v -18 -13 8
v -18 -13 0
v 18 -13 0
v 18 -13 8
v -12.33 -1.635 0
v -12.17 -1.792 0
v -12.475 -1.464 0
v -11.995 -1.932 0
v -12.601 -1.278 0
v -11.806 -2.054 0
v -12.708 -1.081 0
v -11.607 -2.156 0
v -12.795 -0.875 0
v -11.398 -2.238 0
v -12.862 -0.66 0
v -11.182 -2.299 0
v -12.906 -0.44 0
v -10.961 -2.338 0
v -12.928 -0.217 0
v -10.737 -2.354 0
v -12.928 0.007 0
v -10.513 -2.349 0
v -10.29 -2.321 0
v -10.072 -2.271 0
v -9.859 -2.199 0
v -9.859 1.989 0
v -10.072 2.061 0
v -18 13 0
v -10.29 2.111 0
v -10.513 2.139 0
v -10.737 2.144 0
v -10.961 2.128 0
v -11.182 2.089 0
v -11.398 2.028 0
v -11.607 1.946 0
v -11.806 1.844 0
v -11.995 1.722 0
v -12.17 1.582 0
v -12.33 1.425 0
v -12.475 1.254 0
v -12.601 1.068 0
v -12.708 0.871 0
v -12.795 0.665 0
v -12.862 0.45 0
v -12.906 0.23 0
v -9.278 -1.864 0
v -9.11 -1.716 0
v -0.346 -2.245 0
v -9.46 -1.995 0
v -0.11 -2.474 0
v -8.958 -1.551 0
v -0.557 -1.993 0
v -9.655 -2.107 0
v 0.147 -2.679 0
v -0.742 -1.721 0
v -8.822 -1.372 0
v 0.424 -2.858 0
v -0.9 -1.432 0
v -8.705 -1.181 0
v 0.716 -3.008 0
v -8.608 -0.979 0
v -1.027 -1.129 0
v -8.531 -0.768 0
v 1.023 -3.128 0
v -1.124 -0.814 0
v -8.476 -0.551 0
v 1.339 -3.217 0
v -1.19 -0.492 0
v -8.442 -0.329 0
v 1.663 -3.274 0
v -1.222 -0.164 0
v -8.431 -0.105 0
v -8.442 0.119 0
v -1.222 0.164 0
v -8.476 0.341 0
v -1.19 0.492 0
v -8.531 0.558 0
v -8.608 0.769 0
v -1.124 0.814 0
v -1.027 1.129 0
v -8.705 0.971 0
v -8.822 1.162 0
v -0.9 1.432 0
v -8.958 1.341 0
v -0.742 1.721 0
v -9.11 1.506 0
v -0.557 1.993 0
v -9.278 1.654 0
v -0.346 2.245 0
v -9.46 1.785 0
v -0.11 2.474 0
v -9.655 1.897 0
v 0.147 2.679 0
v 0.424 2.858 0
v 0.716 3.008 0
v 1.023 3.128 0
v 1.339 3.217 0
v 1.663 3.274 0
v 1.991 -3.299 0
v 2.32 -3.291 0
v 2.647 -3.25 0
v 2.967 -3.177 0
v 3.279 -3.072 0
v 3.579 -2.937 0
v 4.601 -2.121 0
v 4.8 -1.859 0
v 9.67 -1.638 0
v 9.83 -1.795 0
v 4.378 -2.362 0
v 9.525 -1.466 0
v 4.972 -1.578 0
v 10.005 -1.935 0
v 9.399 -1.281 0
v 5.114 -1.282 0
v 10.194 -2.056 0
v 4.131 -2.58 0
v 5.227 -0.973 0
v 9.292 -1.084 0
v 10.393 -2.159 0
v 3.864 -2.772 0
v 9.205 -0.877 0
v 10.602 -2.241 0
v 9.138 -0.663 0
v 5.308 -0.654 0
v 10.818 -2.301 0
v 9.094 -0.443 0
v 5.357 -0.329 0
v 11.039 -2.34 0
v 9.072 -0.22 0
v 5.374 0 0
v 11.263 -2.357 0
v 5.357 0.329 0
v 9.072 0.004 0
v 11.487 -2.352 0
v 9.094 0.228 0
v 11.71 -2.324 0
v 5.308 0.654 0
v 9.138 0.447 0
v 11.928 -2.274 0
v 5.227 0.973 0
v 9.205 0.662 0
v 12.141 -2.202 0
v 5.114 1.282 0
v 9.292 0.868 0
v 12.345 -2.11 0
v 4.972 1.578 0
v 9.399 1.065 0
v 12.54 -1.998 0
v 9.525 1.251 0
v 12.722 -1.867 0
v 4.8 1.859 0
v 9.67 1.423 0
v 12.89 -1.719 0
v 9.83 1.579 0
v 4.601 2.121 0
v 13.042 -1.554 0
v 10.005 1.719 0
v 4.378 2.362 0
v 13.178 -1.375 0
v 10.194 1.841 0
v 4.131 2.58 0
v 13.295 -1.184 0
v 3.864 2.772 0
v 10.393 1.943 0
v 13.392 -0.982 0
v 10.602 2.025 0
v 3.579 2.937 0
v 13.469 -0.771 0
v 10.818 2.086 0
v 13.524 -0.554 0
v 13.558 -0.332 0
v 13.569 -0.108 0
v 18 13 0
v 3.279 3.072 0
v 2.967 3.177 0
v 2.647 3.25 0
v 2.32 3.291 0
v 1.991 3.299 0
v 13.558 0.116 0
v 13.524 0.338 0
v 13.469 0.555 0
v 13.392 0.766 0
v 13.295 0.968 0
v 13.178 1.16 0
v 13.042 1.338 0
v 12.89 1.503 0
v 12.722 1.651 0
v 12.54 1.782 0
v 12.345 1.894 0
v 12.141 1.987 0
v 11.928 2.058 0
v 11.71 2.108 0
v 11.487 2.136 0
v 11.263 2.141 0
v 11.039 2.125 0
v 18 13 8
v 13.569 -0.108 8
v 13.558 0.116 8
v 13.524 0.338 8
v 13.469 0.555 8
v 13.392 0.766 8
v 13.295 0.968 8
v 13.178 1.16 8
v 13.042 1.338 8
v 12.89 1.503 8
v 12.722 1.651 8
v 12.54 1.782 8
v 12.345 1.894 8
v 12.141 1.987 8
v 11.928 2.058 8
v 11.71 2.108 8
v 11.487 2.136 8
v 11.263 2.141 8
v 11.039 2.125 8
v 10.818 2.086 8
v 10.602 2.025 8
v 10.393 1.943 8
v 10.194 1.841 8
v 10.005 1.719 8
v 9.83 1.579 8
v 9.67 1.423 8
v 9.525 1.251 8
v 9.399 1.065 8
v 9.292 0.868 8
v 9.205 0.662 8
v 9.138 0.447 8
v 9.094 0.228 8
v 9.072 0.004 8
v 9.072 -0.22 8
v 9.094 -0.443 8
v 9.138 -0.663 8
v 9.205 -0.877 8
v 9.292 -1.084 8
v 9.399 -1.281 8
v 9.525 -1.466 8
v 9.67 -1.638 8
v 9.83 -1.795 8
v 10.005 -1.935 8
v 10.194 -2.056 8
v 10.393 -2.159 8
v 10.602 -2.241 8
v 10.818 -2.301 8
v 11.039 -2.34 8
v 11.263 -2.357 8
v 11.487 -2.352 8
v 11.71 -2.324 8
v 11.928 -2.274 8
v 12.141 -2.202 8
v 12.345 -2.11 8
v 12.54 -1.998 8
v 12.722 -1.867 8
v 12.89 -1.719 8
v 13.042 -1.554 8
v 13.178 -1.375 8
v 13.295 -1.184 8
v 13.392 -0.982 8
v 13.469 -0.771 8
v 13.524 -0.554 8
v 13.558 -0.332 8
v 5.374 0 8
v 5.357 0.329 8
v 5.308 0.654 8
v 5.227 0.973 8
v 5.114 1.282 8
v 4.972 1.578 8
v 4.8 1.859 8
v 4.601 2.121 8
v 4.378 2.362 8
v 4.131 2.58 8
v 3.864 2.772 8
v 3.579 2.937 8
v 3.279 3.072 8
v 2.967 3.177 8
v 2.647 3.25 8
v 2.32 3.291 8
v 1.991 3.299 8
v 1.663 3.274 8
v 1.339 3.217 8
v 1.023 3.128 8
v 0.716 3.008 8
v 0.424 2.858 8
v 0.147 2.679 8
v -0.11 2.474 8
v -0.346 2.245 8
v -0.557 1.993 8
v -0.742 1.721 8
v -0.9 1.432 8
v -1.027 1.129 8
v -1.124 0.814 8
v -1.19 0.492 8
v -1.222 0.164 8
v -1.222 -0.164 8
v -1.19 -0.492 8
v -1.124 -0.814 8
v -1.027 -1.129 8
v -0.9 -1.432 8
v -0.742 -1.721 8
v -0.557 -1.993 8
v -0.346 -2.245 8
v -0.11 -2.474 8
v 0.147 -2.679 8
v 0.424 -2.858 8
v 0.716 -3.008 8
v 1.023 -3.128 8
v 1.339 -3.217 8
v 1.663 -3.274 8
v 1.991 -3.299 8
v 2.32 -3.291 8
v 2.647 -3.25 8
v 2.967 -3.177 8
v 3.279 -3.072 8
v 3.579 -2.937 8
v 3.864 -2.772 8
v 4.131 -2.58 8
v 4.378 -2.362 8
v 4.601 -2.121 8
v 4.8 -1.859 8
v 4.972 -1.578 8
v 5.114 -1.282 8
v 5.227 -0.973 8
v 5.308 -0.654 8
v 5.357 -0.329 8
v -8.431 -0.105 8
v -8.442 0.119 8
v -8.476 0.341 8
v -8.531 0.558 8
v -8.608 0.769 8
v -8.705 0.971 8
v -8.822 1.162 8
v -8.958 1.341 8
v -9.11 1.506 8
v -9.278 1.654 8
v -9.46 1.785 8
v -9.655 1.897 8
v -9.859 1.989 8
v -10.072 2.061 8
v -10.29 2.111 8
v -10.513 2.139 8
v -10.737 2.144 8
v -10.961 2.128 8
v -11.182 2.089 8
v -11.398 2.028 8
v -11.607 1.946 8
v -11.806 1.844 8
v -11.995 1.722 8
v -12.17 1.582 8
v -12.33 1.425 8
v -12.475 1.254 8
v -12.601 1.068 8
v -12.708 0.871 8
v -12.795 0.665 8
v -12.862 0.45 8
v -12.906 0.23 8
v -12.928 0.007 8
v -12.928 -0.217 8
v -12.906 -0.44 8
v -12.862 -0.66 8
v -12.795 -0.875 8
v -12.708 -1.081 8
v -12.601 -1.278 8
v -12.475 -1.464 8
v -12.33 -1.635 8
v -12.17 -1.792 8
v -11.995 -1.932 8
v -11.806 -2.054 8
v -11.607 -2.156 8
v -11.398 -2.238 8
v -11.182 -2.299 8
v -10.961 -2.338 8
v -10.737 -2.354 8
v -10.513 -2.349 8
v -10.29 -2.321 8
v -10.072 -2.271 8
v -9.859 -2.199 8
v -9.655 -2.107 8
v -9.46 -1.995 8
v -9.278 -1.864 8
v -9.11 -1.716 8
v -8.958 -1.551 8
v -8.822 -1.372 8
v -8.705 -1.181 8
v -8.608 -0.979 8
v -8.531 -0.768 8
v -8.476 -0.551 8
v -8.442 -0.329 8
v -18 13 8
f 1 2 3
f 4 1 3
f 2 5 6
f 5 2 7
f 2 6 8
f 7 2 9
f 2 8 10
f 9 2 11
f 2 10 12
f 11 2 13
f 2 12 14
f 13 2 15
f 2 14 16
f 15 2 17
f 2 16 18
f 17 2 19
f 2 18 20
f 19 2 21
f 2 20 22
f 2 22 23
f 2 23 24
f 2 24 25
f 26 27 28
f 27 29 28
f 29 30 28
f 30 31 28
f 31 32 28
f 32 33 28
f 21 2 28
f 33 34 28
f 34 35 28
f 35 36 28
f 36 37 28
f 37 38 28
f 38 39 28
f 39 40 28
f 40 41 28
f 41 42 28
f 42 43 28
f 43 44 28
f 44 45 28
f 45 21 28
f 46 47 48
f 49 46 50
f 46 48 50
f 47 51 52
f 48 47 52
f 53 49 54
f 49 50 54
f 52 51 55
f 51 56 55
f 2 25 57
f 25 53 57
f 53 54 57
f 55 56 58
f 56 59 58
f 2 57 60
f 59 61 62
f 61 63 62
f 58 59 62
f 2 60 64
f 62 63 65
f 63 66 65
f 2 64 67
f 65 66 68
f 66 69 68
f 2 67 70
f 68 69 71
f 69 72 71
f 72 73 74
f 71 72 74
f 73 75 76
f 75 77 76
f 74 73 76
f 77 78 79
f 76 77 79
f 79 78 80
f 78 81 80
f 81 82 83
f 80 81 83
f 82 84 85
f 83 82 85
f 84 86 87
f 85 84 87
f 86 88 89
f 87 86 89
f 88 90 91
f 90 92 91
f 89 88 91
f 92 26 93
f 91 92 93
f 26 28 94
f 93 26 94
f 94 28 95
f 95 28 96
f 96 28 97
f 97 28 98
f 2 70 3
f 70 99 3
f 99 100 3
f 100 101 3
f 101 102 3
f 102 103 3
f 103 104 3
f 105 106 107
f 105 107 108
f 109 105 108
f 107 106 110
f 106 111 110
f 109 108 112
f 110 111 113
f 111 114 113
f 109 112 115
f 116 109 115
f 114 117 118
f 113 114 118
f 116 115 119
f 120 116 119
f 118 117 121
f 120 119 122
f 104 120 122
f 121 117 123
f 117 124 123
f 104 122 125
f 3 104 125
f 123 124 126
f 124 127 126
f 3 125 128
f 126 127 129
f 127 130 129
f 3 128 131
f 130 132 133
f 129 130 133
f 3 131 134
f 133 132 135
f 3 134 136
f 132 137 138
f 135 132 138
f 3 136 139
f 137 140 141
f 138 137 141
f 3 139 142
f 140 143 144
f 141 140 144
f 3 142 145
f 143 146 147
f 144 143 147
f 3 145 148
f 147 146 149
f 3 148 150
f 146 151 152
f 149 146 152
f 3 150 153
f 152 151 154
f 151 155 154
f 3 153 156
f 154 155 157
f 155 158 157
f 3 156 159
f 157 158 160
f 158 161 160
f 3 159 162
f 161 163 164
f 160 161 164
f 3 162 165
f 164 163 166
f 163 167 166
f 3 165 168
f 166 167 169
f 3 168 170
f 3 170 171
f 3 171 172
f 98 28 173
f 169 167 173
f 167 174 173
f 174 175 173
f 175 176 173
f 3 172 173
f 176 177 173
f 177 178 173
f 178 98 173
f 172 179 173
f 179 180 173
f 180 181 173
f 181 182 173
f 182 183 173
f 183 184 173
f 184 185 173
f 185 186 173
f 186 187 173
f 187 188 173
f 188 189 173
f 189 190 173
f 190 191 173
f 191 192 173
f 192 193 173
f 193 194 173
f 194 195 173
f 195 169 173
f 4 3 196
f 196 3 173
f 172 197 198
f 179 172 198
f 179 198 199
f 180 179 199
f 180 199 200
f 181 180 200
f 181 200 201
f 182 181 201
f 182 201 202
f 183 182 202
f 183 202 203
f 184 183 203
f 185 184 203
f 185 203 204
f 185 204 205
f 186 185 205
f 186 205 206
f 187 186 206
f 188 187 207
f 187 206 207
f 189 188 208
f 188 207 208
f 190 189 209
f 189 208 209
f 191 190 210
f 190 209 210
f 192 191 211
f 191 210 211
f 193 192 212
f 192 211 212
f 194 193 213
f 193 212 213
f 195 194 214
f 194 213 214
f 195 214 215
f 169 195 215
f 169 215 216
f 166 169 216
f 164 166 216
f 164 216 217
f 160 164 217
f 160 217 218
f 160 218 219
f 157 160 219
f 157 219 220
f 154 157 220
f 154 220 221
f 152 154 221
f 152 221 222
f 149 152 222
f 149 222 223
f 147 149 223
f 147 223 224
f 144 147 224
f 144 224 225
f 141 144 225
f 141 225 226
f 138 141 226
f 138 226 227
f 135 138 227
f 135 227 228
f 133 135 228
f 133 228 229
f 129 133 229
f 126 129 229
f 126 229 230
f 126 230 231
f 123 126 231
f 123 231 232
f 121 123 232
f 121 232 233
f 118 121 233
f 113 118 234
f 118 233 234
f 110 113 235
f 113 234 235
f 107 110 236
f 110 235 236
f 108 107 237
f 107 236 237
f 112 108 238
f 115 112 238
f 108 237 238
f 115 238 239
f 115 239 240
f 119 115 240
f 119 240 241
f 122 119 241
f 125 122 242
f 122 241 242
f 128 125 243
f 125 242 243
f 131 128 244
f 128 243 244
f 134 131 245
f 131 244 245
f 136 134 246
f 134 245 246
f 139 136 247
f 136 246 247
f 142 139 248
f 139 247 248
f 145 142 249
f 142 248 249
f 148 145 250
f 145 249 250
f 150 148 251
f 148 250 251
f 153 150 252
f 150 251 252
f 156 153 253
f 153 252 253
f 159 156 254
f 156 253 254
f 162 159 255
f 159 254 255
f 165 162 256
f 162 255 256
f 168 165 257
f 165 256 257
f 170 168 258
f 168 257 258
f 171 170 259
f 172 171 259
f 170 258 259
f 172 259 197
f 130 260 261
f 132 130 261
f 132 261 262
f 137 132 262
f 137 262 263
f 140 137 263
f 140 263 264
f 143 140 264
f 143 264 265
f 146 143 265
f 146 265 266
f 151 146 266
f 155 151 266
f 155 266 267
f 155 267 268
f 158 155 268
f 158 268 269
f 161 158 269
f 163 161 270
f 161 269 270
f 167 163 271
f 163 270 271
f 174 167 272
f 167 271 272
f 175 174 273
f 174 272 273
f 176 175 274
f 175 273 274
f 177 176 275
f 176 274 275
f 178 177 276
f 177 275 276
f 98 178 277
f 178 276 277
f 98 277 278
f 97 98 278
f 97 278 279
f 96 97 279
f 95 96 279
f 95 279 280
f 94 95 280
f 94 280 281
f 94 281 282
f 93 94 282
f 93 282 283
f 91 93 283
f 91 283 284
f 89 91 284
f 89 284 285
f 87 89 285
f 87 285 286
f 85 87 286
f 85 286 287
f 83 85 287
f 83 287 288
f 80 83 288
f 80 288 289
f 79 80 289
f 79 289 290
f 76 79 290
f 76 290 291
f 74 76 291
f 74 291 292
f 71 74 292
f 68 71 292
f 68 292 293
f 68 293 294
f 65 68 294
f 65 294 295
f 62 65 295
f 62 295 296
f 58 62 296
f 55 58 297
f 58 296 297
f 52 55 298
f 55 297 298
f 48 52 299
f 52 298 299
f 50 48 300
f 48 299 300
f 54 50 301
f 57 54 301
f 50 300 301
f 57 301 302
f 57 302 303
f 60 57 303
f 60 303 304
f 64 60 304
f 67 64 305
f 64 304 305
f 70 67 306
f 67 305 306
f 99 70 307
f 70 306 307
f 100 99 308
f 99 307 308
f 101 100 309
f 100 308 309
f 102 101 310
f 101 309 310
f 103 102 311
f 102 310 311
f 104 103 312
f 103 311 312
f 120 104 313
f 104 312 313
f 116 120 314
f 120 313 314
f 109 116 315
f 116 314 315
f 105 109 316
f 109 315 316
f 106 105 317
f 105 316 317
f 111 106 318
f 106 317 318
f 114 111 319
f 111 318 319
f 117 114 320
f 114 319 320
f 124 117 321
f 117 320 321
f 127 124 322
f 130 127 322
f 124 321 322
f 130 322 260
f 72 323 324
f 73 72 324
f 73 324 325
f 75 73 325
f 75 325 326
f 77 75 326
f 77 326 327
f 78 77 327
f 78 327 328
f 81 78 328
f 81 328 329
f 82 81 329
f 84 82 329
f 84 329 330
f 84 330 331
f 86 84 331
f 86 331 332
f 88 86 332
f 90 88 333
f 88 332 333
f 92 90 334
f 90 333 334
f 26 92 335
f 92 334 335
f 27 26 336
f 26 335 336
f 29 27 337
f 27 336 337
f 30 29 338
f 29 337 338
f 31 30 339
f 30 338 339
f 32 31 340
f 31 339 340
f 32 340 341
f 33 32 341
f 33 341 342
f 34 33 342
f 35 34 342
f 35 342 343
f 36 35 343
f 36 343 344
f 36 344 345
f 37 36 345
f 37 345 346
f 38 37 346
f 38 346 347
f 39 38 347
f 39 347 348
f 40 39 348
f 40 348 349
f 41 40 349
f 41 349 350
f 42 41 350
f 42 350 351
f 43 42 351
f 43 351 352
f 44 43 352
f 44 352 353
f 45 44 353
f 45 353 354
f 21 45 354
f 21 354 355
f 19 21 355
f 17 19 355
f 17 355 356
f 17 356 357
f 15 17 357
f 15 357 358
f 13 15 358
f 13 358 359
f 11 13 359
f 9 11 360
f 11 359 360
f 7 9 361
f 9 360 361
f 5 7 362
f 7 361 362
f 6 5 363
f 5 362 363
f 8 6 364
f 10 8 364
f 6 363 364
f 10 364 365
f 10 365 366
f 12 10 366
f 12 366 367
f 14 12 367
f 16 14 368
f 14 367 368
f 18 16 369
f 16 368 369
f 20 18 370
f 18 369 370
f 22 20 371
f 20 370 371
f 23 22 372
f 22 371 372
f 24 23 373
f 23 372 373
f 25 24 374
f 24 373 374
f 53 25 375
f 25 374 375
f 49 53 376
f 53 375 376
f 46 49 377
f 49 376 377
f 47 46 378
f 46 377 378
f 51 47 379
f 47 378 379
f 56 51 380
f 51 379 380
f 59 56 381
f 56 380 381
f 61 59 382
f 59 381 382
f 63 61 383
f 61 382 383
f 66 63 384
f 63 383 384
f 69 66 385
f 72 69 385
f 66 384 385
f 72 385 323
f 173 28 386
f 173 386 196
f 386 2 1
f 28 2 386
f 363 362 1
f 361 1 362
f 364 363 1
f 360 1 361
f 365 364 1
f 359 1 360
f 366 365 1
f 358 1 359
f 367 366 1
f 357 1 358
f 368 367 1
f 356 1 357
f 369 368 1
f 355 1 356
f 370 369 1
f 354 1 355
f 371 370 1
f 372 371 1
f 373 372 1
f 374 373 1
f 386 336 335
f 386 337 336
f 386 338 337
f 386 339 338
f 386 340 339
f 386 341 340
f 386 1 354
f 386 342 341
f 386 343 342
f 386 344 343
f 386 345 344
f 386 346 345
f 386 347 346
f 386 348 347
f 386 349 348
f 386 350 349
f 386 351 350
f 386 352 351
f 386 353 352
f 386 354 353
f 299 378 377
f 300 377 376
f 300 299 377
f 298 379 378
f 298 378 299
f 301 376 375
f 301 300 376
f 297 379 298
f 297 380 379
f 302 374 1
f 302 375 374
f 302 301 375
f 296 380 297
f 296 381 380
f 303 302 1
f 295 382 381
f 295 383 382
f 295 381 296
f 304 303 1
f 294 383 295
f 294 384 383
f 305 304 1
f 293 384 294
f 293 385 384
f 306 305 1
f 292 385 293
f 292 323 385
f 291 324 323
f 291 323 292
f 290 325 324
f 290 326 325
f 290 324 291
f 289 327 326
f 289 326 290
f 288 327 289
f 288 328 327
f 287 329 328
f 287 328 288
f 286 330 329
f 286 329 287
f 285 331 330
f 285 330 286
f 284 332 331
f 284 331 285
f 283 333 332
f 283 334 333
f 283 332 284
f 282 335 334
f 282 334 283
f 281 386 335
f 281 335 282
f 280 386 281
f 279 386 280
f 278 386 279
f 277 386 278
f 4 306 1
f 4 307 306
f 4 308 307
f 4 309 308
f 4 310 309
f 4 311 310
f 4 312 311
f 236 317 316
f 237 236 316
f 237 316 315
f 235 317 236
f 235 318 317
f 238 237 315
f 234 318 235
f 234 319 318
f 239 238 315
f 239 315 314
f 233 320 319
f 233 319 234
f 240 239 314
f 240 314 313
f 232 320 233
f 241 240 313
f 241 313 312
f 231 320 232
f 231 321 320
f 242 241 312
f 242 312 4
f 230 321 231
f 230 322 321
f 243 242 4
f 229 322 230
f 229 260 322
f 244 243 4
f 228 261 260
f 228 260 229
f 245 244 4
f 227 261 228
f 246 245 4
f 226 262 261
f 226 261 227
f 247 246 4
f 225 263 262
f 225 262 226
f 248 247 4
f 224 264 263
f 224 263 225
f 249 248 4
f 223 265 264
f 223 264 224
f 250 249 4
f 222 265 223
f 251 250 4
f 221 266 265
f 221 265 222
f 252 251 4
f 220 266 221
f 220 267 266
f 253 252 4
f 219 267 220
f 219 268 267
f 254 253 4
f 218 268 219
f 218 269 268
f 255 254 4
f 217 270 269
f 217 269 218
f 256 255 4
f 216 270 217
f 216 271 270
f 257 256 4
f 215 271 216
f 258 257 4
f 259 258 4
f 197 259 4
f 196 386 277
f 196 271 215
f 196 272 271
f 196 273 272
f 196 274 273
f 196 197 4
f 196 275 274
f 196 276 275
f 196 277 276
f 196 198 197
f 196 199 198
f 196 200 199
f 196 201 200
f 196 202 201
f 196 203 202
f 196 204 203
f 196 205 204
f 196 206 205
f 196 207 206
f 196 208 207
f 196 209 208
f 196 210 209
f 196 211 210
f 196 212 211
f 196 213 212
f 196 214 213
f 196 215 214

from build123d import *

# Parameters (mm, degrees)
ESQUISSE1_W          = 36
ESQUISSE1_H          = 26
BOSS_EXTRU_1_DEPTH   = 8
D_GAGEMENT_M41_D     = 4.5
M6_CLEARANCE_HOLE2_D = 6.6


with BuildPart() as part:
    # Esquisse1 → Boss.-Extru.1 (new body)
    with BuildSketch(Plane.XY):
        Rectangle(ESQUISSE1_W, ESQUISSE1_H)
    extrude(amount=BOSS_EXTRU_1_DEPTH)

    # Dégagement M41 (through all)
    with Locations(Plane(origin=(0, 0, 0), x_dir=(-1, 0, 0), z_dir=(0, 0, -1))):
        with Locations((-11.318887596, -0.107841378), (10.681112224, -0.10502754)):
            Hole(D_GAGEMENT_M41_D / 2)

    # M6 Clearance Hole2 (through all)
    with Locations(Plane(origin=(0, 0, 0), x_dir=(-1, 0, 0), z_dir=(0, 0, -1))):
        with Locations((-2.073526459, 0)):
            Hole(M6_CLEARANCE_HOLE2_D / 2)


solid = part.part
